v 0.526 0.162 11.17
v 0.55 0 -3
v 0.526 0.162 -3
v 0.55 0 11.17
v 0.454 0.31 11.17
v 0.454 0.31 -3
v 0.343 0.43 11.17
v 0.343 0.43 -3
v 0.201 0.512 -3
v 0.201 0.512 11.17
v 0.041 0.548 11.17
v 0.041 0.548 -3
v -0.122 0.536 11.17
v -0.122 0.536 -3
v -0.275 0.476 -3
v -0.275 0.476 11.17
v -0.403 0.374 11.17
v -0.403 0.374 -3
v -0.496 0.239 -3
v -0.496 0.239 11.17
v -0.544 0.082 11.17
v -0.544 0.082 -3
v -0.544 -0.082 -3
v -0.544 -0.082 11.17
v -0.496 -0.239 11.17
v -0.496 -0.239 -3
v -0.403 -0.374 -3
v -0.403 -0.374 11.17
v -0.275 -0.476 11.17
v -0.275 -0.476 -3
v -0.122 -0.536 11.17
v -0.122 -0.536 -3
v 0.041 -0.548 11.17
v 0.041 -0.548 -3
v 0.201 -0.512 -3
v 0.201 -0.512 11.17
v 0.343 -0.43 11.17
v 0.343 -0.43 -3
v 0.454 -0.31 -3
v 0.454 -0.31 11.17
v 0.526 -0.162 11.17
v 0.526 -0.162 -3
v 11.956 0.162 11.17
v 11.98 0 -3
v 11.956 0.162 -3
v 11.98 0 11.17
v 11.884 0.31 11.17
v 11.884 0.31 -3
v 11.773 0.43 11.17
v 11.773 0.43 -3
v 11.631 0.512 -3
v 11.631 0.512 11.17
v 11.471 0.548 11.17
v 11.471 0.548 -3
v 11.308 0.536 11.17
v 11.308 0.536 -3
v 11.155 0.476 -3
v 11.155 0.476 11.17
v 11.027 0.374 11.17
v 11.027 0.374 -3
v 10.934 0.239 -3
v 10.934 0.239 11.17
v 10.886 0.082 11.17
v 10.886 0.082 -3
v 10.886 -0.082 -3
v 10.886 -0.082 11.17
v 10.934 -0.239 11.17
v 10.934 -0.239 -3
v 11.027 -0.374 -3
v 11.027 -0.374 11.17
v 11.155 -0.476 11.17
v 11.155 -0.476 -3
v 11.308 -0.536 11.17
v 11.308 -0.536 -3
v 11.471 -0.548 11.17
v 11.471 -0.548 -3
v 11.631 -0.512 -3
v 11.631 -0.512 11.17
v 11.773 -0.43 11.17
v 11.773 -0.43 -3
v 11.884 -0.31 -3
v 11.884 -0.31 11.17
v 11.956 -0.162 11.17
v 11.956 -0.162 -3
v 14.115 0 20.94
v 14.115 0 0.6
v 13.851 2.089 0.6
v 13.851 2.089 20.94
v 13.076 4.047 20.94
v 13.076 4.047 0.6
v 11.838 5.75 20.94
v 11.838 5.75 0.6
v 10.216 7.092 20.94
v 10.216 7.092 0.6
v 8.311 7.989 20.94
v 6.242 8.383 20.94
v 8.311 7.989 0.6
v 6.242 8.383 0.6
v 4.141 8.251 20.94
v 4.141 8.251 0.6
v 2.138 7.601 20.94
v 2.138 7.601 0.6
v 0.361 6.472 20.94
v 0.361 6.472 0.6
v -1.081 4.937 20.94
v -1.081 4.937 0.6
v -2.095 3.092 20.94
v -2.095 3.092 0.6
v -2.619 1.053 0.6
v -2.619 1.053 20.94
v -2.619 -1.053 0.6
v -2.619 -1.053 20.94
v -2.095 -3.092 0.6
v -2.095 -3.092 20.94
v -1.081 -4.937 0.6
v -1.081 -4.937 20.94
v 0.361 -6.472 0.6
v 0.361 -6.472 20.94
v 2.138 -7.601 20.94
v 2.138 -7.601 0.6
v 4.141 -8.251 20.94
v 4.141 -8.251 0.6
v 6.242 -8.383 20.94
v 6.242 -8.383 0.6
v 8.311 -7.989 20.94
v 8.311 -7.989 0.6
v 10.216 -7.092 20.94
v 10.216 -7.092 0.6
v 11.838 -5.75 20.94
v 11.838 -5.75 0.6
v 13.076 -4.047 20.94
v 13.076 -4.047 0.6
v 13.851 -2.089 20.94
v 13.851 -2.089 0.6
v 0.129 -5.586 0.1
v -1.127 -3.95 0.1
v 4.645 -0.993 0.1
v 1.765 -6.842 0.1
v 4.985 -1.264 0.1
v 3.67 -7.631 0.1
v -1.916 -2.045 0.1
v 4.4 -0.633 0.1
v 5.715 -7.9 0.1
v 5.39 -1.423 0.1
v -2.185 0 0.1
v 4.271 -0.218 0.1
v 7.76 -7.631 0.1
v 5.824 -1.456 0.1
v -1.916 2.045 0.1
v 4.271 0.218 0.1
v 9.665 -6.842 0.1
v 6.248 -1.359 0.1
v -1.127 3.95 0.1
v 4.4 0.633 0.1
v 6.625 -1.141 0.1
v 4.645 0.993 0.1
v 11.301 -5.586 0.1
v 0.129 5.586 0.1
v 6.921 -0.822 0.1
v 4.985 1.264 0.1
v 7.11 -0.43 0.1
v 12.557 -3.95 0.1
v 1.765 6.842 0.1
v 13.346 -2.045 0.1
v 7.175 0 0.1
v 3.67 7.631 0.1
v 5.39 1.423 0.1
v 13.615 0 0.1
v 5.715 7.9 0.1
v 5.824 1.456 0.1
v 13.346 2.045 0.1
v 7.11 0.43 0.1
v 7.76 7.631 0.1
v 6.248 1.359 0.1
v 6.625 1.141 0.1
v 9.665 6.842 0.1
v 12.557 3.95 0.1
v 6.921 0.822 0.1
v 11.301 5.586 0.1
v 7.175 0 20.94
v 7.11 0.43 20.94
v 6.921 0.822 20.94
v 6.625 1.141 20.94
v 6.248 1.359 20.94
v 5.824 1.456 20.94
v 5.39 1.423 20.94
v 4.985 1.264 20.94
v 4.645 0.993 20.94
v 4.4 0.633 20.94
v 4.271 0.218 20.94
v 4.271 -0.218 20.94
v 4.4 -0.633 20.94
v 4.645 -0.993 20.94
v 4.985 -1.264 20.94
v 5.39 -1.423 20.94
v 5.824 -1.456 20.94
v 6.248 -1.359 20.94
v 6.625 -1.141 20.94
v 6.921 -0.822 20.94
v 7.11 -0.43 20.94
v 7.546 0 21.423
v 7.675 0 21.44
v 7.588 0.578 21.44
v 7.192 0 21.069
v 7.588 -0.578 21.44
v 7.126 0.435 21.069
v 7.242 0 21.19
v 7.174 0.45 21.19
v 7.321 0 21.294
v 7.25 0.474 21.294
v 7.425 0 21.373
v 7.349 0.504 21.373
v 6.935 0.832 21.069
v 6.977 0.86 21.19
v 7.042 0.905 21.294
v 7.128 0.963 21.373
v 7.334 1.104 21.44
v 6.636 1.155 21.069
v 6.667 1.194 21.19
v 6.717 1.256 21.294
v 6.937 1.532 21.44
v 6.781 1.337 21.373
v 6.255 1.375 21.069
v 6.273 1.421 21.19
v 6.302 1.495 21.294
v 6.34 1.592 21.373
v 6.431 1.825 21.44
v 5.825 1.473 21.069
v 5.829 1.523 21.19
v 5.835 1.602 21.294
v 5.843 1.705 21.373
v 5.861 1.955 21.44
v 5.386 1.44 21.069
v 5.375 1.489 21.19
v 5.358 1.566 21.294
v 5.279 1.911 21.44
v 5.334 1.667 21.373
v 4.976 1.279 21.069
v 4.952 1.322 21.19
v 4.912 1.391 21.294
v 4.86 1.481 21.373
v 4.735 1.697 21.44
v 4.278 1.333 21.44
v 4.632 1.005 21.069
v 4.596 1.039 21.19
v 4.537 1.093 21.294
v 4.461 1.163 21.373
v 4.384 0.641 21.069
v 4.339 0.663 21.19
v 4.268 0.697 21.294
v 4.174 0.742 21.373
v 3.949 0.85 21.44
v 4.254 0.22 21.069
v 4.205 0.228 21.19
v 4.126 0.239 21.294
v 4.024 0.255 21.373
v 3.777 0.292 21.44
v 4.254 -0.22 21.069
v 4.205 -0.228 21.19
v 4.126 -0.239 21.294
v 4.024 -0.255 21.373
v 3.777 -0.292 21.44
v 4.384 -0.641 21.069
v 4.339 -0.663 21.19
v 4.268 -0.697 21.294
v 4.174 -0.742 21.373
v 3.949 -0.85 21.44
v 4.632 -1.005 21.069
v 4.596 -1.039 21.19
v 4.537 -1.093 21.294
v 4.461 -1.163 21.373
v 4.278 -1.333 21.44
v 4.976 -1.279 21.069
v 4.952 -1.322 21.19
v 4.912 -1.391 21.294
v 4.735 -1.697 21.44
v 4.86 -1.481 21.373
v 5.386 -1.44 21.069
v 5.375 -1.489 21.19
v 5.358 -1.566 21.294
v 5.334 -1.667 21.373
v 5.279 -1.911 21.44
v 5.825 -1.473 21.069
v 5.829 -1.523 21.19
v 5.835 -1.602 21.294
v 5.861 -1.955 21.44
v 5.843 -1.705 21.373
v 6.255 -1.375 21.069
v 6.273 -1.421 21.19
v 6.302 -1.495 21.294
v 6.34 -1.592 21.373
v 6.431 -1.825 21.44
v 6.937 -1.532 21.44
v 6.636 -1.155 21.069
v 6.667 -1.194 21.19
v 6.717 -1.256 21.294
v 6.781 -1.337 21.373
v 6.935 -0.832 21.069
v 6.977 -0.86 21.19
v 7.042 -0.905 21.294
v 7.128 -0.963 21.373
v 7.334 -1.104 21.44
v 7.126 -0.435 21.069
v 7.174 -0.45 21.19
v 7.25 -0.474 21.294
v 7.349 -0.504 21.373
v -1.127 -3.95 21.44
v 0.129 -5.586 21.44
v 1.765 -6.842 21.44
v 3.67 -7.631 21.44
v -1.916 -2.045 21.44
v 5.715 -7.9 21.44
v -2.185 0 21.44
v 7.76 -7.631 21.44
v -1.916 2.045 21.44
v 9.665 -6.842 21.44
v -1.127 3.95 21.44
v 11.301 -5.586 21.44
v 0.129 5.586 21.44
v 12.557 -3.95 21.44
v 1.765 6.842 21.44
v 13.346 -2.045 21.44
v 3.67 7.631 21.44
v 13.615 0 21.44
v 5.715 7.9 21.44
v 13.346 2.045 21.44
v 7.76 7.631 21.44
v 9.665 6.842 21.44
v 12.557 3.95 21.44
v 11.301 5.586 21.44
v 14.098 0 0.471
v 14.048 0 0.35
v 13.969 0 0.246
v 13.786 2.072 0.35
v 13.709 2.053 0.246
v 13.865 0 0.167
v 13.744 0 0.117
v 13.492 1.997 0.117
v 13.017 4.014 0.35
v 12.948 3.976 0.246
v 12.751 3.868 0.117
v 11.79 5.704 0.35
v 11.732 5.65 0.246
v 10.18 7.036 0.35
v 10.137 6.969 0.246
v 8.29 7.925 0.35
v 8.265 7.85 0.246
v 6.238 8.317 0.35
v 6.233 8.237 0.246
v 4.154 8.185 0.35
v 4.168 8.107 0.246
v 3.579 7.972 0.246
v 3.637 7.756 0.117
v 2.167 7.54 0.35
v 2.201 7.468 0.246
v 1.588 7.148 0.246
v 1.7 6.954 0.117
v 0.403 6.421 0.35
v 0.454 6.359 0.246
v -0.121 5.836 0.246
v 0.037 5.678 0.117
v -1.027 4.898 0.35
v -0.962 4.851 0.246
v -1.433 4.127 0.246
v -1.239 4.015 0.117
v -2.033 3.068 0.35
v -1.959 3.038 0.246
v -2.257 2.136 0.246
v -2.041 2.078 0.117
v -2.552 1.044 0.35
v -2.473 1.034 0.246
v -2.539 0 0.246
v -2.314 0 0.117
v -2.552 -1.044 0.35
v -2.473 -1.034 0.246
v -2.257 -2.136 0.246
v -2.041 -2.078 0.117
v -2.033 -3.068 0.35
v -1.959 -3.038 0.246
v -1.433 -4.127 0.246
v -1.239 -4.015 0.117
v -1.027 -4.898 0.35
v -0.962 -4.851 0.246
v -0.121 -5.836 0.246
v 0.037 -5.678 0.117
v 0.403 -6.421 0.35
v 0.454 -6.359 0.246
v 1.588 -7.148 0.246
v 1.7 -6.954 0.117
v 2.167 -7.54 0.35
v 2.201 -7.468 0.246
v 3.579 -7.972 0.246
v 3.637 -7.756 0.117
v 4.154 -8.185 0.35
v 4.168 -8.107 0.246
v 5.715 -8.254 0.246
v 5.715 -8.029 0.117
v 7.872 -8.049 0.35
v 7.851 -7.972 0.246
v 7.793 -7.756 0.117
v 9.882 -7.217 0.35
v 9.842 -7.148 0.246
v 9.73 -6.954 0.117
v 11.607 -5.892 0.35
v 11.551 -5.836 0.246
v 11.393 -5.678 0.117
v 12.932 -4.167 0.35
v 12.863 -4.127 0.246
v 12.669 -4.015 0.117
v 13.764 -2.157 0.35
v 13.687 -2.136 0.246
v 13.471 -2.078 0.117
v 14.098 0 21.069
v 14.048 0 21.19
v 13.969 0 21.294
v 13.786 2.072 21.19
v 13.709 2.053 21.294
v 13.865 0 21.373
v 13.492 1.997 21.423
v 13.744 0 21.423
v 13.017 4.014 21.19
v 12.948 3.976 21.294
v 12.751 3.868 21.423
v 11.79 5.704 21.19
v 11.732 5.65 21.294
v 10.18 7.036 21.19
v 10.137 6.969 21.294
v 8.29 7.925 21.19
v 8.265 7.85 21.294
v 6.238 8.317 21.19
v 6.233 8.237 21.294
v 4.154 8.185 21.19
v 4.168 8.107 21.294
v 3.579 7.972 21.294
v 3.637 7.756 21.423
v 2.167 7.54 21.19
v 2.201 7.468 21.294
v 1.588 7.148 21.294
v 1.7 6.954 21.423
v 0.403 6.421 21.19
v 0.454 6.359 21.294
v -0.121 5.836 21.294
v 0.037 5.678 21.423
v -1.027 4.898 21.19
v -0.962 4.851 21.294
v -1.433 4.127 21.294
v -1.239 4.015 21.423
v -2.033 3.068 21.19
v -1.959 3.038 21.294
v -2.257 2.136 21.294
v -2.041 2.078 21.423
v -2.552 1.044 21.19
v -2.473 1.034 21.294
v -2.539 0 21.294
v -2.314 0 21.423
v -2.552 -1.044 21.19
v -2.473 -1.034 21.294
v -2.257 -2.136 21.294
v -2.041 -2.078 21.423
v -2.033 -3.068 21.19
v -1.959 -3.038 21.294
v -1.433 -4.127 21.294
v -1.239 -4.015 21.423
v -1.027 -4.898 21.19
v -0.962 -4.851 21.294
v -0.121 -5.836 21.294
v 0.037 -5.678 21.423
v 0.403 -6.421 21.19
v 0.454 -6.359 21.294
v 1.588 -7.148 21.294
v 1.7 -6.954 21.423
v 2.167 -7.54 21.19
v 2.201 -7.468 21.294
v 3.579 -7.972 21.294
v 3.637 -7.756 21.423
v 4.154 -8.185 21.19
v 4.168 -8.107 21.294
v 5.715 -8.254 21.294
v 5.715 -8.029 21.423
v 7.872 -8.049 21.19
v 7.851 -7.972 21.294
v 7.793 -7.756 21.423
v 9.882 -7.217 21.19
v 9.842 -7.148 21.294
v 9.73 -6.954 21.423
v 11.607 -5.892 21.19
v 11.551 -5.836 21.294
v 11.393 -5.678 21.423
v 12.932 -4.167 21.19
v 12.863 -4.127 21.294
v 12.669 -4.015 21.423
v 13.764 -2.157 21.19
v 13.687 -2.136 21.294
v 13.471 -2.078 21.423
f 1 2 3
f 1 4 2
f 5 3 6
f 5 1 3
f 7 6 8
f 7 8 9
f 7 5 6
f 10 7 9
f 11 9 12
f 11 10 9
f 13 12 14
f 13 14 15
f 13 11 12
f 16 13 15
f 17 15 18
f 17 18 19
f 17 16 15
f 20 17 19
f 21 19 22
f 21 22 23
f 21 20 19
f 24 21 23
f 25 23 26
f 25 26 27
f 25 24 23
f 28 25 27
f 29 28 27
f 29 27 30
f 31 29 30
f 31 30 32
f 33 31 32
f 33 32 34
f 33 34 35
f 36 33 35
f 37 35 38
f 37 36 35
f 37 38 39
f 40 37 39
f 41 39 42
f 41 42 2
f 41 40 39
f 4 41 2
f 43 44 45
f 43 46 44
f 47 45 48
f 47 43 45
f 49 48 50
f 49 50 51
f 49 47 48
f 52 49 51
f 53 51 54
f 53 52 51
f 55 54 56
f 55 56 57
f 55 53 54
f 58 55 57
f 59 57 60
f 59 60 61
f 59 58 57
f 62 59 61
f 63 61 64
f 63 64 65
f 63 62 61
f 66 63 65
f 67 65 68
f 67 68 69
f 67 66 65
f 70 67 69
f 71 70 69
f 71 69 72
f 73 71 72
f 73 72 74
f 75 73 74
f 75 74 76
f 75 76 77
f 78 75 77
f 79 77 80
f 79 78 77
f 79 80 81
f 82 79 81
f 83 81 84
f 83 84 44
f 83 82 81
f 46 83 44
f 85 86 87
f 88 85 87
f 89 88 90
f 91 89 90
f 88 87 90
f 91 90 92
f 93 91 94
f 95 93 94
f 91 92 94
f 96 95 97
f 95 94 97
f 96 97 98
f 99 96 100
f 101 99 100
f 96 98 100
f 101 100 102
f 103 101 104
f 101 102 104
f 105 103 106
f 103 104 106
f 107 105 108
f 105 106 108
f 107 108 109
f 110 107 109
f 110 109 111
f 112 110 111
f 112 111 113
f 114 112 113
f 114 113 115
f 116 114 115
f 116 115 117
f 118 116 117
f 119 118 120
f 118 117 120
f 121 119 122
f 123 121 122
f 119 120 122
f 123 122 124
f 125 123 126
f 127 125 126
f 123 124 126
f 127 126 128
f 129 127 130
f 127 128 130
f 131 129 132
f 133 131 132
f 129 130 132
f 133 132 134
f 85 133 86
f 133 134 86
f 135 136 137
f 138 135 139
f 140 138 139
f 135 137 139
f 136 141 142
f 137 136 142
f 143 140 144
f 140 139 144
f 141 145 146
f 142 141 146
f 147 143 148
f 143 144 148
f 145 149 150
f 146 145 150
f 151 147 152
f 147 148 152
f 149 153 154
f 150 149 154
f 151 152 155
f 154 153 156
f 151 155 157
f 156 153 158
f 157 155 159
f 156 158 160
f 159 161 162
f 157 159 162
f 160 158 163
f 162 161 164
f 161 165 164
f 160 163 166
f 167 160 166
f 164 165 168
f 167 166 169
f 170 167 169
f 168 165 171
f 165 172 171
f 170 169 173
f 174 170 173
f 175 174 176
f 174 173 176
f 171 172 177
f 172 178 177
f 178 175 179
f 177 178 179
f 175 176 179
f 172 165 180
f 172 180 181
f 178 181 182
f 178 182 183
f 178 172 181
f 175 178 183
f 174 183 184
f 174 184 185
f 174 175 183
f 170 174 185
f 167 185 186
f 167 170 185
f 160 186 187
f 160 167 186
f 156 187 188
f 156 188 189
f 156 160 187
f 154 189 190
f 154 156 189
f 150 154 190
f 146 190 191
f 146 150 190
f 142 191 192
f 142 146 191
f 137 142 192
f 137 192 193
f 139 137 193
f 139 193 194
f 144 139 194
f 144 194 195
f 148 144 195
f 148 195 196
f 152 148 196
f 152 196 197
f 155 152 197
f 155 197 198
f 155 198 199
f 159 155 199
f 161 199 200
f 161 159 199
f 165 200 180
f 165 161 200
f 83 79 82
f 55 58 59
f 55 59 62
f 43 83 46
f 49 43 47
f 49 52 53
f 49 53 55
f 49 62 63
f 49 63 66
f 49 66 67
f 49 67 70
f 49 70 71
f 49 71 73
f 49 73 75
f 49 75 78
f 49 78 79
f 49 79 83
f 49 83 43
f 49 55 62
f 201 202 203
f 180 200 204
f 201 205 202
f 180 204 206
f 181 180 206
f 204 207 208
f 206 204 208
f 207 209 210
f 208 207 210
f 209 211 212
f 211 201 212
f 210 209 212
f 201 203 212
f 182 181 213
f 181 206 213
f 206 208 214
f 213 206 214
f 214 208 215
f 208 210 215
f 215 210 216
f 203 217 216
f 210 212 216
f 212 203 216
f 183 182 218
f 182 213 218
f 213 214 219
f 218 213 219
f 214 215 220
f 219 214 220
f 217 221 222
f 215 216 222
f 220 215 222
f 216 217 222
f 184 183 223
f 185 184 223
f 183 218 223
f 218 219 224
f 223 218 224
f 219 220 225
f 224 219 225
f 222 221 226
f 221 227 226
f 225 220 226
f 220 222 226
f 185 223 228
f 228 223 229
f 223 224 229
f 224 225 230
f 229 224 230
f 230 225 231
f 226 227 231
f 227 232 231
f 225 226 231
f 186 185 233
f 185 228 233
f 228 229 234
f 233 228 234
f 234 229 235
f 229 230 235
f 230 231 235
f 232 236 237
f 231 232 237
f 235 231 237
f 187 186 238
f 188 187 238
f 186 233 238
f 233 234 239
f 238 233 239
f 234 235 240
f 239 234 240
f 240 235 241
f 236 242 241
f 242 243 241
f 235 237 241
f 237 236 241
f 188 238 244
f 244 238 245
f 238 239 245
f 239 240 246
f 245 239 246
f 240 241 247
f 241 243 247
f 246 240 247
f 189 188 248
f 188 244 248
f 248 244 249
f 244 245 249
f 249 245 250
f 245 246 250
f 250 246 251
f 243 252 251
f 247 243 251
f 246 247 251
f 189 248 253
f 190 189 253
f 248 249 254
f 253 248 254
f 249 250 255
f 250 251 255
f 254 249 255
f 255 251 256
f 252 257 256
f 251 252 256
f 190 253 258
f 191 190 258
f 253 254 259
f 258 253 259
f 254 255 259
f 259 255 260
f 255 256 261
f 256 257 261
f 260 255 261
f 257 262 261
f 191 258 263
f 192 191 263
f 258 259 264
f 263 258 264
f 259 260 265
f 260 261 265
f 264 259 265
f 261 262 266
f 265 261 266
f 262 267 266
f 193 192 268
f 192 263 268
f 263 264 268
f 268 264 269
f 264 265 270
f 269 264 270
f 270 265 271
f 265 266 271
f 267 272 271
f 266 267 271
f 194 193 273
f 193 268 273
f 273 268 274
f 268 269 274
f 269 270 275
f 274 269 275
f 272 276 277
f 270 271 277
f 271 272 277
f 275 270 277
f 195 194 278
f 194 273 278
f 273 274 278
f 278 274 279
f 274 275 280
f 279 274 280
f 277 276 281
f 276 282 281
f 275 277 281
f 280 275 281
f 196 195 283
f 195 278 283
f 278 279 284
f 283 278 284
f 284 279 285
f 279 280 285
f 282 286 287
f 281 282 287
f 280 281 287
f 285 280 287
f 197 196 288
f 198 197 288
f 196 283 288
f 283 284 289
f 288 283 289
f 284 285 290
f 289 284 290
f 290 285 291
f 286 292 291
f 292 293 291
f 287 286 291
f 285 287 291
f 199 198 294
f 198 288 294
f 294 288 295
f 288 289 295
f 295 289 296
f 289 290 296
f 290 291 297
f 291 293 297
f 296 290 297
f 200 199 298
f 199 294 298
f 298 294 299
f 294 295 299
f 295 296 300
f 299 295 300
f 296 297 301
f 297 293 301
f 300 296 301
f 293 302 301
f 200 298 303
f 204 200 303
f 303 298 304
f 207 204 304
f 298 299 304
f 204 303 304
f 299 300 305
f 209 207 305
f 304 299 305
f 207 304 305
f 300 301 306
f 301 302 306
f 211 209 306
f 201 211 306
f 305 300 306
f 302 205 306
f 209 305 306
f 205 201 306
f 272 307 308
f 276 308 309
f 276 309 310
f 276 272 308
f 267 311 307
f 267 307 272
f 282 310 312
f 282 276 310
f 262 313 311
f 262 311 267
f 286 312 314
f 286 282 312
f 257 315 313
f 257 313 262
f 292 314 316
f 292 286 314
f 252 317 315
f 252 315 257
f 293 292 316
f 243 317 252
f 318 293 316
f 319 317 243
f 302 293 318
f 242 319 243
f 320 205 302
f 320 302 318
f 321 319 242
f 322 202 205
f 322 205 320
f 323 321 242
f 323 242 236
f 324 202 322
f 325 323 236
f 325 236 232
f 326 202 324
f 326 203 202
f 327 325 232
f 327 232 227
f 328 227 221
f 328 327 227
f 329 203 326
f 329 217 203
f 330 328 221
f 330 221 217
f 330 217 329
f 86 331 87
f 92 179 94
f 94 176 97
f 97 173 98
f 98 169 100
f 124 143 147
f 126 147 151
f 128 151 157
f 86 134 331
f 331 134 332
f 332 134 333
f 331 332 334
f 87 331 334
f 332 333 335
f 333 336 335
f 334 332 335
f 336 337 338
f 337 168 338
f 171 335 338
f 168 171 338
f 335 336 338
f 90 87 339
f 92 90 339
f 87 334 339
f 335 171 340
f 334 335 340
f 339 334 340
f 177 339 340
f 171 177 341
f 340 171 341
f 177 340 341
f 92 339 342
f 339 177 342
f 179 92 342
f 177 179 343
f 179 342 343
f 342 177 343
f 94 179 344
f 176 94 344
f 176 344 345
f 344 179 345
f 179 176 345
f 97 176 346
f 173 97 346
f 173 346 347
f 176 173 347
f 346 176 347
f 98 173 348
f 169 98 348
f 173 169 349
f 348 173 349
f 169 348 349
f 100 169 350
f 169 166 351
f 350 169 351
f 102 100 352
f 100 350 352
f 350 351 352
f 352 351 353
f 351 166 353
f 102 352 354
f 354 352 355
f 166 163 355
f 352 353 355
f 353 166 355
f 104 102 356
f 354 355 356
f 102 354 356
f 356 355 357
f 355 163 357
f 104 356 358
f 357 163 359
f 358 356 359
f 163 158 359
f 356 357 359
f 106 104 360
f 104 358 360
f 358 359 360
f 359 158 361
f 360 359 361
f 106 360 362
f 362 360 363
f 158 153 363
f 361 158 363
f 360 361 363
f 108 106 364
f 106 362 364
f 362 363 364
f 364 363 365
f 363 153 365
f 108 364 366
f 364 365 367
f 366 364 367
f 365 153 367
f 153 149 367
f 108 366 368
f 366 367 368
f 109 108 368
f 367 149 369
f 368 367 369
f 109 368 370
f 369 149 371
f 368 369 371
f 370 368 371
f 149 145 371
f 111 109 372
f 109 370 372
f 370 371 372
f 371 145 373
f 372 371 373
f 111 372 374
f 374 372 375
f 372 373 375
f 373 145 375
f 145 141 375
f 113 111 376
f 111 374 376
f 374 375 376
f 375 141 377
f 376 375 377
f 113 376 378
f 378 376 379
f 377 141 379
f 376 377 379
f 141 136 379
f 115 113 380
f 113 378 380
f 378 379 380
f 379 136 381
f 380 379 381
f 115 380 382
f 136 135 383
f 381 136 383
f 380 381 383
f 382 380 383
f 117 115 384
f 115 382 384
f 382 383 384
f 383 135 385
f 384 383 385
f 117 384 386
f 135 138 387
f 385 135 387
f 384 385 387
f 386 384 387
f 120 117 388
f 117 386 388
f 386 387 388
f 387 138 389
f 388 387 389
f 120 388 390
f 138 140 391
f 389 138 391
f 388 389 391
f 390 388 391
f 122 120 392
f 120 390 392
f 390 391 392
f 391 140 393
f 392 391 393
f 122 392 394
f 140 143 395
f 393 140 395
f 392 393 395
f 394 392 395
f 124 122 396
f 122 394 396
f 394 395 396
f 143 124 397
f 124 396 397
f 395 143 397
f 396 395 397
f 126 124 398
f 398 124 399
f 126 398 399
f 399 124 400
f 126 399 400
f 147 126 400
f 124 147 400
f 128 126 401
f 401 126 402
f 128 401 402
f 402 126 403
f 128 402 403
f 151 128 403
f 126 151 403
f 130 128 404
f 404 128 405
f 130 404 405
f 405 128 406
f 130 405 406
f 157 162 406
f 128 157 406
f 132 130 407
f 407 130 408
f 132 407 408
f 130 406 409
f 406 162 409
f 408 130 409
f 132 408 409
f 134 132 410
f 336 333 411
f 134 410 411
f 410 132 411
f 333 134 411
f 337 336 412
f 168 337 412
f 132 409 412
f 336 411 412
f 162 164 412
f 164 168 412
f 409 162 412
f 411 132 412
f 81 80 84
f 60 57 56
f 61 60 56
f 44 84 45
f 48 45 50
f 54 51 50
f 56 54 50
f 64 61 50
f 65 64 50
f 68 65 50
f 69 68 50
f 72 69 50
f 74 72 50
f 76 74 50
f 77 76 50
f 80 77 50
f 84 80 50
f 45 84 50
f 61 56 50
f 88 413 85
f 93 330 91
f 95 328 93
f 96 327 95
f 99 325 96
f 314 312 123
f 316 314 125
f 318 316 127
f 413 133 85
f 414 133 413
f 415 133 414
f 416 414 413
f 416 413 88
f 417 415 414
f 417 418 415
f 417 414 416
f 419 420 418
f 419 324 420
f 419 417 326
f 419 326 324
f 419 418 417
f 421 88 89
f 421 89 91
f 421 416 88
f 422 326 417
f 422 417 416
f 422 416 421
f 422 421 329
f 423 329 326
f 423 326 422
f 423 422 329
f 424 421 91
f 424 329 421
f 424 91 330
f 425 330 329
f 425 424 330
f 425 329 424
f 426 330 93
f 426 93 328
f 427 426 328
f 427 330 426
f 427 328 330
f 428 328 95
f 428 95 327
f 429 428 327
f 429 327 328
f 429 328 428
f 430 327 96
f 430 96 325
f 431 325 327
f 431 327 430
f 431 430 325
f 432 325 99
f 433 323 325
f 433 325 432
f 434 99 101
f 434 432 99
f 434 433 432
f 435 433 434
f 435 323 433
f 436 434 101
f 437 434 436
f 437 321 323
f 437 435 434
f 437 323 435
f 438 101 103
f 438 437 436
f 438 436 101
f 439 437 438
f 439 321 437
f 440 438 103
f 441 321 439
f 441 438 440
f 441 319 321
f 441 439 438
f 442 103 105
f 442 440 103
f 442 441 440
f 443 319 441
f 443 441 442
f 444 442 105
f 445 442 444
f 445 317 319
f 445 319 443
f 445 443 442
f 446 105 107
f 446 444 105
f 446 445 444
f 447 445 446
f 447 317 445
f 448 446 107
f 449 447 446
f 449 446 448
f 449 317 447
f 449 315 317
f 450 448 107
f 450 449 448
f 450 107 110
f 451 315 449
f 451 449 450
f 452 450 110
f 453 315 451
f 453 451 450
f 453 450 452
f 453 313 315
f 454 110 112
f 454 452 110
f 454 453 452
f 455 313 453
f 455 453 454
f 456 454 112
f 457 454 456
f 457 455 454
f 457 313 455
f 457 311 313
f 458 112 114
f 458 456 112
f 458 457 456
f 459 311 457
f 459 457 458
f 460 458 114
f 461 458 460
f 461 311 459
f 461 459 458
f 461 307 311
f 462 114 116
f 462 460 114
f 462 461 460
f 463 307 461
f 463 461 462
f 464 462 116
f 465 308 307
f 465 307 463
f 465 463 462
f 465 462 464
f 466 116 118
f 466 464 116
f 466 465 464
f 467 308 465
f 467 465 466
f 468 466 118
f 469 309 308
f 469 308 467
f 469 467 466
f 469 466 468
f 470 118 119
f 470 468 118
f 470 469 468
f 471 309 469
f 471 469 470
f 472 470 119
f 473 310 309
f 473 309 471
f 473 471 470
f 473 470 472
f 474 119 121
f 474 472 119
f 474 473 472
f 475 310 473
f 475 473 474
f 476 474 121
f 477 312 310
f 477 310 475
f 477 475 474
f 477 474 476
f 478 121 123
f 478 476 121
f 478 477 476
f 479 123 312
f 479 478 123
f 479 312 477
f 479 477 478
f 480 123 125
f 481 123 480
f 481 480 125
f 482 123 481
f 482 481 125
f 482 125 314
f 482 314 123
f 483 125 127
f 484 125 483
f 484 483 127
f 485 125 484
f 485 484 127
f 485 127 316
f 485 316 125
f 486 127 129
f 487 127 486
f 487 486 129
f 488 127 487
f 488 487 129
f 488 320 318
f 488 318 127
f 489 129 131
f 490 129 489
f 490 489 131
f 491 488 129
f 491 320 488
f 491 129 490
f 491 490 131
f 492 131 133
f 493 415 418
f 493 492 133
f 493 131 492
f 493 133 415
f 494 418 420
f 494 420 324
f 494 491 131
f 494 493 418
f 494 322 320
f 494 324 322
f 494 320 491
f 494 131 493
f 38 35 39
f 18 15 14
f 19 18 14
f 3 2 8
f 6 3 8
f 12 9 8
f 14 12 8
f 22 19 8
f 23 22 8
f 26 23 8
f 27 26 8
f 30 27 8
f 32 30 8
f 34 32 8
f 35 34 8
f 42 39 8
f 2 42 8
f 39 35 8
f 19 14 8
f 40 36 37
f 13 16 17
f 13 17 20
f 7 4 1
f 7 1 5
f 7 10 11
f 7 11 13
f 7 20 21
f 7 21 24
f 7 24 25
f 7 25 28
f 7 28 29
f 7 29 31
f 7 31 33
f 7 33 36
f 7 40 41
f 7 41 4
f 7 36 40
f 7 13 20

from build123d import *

# Parameters (mm, degrees)
SKETCH001_R       = 0.55
PAD001_DEPTH      = 10.67
PAD001_DEPTH_BACK = 3.5
SKETCH_R          = 8.4
SKETCH_R_2        = 1.46
PAD_DEPTH         = 21.34
FILLET_R          = 0.5


with BuildPart() as pad001:
    # Sketch001 → Pad001 (new body, two sides)
    with BuildSketch(Plane.XY.offset(0.5)) as pad001_sk:
        Circle(SKETCH001_R)
        with Locations((11.43, 0)):
            Circle(SKETCH001_R)
    extrude(amount=PAD001_DEPTH)
    extrude(pad001_sk.sketch, amount=-PAD001_DEPTH_BACK)


with BuildPart() as fillet_body:
    # Sketch → Pad (new body)
    with BuildSketch(Plane.XY.offset(0.1)):
        with Locations((5.715, 0)):
            Circle(SKETCH_R)
        with Locations((5.715, 0)):
            Circle(SKETCH_R_2, mode=Mode.SUBTRACT)
    extrude(amount=PAD_DEPTH)

    # Fillet
    fillet_edges = [fillet_body.edges().sort_by_distance(p)[0] for p in [
        (4.255, 0, 21.44),
        (-2.685, 0, 21.44),
        (-2.685, 0, 0.1),
    ]]
    fillet(fillet_edges, radius=FILLET_R)


solid = Compound([pad001.part, fillet_body.part])
